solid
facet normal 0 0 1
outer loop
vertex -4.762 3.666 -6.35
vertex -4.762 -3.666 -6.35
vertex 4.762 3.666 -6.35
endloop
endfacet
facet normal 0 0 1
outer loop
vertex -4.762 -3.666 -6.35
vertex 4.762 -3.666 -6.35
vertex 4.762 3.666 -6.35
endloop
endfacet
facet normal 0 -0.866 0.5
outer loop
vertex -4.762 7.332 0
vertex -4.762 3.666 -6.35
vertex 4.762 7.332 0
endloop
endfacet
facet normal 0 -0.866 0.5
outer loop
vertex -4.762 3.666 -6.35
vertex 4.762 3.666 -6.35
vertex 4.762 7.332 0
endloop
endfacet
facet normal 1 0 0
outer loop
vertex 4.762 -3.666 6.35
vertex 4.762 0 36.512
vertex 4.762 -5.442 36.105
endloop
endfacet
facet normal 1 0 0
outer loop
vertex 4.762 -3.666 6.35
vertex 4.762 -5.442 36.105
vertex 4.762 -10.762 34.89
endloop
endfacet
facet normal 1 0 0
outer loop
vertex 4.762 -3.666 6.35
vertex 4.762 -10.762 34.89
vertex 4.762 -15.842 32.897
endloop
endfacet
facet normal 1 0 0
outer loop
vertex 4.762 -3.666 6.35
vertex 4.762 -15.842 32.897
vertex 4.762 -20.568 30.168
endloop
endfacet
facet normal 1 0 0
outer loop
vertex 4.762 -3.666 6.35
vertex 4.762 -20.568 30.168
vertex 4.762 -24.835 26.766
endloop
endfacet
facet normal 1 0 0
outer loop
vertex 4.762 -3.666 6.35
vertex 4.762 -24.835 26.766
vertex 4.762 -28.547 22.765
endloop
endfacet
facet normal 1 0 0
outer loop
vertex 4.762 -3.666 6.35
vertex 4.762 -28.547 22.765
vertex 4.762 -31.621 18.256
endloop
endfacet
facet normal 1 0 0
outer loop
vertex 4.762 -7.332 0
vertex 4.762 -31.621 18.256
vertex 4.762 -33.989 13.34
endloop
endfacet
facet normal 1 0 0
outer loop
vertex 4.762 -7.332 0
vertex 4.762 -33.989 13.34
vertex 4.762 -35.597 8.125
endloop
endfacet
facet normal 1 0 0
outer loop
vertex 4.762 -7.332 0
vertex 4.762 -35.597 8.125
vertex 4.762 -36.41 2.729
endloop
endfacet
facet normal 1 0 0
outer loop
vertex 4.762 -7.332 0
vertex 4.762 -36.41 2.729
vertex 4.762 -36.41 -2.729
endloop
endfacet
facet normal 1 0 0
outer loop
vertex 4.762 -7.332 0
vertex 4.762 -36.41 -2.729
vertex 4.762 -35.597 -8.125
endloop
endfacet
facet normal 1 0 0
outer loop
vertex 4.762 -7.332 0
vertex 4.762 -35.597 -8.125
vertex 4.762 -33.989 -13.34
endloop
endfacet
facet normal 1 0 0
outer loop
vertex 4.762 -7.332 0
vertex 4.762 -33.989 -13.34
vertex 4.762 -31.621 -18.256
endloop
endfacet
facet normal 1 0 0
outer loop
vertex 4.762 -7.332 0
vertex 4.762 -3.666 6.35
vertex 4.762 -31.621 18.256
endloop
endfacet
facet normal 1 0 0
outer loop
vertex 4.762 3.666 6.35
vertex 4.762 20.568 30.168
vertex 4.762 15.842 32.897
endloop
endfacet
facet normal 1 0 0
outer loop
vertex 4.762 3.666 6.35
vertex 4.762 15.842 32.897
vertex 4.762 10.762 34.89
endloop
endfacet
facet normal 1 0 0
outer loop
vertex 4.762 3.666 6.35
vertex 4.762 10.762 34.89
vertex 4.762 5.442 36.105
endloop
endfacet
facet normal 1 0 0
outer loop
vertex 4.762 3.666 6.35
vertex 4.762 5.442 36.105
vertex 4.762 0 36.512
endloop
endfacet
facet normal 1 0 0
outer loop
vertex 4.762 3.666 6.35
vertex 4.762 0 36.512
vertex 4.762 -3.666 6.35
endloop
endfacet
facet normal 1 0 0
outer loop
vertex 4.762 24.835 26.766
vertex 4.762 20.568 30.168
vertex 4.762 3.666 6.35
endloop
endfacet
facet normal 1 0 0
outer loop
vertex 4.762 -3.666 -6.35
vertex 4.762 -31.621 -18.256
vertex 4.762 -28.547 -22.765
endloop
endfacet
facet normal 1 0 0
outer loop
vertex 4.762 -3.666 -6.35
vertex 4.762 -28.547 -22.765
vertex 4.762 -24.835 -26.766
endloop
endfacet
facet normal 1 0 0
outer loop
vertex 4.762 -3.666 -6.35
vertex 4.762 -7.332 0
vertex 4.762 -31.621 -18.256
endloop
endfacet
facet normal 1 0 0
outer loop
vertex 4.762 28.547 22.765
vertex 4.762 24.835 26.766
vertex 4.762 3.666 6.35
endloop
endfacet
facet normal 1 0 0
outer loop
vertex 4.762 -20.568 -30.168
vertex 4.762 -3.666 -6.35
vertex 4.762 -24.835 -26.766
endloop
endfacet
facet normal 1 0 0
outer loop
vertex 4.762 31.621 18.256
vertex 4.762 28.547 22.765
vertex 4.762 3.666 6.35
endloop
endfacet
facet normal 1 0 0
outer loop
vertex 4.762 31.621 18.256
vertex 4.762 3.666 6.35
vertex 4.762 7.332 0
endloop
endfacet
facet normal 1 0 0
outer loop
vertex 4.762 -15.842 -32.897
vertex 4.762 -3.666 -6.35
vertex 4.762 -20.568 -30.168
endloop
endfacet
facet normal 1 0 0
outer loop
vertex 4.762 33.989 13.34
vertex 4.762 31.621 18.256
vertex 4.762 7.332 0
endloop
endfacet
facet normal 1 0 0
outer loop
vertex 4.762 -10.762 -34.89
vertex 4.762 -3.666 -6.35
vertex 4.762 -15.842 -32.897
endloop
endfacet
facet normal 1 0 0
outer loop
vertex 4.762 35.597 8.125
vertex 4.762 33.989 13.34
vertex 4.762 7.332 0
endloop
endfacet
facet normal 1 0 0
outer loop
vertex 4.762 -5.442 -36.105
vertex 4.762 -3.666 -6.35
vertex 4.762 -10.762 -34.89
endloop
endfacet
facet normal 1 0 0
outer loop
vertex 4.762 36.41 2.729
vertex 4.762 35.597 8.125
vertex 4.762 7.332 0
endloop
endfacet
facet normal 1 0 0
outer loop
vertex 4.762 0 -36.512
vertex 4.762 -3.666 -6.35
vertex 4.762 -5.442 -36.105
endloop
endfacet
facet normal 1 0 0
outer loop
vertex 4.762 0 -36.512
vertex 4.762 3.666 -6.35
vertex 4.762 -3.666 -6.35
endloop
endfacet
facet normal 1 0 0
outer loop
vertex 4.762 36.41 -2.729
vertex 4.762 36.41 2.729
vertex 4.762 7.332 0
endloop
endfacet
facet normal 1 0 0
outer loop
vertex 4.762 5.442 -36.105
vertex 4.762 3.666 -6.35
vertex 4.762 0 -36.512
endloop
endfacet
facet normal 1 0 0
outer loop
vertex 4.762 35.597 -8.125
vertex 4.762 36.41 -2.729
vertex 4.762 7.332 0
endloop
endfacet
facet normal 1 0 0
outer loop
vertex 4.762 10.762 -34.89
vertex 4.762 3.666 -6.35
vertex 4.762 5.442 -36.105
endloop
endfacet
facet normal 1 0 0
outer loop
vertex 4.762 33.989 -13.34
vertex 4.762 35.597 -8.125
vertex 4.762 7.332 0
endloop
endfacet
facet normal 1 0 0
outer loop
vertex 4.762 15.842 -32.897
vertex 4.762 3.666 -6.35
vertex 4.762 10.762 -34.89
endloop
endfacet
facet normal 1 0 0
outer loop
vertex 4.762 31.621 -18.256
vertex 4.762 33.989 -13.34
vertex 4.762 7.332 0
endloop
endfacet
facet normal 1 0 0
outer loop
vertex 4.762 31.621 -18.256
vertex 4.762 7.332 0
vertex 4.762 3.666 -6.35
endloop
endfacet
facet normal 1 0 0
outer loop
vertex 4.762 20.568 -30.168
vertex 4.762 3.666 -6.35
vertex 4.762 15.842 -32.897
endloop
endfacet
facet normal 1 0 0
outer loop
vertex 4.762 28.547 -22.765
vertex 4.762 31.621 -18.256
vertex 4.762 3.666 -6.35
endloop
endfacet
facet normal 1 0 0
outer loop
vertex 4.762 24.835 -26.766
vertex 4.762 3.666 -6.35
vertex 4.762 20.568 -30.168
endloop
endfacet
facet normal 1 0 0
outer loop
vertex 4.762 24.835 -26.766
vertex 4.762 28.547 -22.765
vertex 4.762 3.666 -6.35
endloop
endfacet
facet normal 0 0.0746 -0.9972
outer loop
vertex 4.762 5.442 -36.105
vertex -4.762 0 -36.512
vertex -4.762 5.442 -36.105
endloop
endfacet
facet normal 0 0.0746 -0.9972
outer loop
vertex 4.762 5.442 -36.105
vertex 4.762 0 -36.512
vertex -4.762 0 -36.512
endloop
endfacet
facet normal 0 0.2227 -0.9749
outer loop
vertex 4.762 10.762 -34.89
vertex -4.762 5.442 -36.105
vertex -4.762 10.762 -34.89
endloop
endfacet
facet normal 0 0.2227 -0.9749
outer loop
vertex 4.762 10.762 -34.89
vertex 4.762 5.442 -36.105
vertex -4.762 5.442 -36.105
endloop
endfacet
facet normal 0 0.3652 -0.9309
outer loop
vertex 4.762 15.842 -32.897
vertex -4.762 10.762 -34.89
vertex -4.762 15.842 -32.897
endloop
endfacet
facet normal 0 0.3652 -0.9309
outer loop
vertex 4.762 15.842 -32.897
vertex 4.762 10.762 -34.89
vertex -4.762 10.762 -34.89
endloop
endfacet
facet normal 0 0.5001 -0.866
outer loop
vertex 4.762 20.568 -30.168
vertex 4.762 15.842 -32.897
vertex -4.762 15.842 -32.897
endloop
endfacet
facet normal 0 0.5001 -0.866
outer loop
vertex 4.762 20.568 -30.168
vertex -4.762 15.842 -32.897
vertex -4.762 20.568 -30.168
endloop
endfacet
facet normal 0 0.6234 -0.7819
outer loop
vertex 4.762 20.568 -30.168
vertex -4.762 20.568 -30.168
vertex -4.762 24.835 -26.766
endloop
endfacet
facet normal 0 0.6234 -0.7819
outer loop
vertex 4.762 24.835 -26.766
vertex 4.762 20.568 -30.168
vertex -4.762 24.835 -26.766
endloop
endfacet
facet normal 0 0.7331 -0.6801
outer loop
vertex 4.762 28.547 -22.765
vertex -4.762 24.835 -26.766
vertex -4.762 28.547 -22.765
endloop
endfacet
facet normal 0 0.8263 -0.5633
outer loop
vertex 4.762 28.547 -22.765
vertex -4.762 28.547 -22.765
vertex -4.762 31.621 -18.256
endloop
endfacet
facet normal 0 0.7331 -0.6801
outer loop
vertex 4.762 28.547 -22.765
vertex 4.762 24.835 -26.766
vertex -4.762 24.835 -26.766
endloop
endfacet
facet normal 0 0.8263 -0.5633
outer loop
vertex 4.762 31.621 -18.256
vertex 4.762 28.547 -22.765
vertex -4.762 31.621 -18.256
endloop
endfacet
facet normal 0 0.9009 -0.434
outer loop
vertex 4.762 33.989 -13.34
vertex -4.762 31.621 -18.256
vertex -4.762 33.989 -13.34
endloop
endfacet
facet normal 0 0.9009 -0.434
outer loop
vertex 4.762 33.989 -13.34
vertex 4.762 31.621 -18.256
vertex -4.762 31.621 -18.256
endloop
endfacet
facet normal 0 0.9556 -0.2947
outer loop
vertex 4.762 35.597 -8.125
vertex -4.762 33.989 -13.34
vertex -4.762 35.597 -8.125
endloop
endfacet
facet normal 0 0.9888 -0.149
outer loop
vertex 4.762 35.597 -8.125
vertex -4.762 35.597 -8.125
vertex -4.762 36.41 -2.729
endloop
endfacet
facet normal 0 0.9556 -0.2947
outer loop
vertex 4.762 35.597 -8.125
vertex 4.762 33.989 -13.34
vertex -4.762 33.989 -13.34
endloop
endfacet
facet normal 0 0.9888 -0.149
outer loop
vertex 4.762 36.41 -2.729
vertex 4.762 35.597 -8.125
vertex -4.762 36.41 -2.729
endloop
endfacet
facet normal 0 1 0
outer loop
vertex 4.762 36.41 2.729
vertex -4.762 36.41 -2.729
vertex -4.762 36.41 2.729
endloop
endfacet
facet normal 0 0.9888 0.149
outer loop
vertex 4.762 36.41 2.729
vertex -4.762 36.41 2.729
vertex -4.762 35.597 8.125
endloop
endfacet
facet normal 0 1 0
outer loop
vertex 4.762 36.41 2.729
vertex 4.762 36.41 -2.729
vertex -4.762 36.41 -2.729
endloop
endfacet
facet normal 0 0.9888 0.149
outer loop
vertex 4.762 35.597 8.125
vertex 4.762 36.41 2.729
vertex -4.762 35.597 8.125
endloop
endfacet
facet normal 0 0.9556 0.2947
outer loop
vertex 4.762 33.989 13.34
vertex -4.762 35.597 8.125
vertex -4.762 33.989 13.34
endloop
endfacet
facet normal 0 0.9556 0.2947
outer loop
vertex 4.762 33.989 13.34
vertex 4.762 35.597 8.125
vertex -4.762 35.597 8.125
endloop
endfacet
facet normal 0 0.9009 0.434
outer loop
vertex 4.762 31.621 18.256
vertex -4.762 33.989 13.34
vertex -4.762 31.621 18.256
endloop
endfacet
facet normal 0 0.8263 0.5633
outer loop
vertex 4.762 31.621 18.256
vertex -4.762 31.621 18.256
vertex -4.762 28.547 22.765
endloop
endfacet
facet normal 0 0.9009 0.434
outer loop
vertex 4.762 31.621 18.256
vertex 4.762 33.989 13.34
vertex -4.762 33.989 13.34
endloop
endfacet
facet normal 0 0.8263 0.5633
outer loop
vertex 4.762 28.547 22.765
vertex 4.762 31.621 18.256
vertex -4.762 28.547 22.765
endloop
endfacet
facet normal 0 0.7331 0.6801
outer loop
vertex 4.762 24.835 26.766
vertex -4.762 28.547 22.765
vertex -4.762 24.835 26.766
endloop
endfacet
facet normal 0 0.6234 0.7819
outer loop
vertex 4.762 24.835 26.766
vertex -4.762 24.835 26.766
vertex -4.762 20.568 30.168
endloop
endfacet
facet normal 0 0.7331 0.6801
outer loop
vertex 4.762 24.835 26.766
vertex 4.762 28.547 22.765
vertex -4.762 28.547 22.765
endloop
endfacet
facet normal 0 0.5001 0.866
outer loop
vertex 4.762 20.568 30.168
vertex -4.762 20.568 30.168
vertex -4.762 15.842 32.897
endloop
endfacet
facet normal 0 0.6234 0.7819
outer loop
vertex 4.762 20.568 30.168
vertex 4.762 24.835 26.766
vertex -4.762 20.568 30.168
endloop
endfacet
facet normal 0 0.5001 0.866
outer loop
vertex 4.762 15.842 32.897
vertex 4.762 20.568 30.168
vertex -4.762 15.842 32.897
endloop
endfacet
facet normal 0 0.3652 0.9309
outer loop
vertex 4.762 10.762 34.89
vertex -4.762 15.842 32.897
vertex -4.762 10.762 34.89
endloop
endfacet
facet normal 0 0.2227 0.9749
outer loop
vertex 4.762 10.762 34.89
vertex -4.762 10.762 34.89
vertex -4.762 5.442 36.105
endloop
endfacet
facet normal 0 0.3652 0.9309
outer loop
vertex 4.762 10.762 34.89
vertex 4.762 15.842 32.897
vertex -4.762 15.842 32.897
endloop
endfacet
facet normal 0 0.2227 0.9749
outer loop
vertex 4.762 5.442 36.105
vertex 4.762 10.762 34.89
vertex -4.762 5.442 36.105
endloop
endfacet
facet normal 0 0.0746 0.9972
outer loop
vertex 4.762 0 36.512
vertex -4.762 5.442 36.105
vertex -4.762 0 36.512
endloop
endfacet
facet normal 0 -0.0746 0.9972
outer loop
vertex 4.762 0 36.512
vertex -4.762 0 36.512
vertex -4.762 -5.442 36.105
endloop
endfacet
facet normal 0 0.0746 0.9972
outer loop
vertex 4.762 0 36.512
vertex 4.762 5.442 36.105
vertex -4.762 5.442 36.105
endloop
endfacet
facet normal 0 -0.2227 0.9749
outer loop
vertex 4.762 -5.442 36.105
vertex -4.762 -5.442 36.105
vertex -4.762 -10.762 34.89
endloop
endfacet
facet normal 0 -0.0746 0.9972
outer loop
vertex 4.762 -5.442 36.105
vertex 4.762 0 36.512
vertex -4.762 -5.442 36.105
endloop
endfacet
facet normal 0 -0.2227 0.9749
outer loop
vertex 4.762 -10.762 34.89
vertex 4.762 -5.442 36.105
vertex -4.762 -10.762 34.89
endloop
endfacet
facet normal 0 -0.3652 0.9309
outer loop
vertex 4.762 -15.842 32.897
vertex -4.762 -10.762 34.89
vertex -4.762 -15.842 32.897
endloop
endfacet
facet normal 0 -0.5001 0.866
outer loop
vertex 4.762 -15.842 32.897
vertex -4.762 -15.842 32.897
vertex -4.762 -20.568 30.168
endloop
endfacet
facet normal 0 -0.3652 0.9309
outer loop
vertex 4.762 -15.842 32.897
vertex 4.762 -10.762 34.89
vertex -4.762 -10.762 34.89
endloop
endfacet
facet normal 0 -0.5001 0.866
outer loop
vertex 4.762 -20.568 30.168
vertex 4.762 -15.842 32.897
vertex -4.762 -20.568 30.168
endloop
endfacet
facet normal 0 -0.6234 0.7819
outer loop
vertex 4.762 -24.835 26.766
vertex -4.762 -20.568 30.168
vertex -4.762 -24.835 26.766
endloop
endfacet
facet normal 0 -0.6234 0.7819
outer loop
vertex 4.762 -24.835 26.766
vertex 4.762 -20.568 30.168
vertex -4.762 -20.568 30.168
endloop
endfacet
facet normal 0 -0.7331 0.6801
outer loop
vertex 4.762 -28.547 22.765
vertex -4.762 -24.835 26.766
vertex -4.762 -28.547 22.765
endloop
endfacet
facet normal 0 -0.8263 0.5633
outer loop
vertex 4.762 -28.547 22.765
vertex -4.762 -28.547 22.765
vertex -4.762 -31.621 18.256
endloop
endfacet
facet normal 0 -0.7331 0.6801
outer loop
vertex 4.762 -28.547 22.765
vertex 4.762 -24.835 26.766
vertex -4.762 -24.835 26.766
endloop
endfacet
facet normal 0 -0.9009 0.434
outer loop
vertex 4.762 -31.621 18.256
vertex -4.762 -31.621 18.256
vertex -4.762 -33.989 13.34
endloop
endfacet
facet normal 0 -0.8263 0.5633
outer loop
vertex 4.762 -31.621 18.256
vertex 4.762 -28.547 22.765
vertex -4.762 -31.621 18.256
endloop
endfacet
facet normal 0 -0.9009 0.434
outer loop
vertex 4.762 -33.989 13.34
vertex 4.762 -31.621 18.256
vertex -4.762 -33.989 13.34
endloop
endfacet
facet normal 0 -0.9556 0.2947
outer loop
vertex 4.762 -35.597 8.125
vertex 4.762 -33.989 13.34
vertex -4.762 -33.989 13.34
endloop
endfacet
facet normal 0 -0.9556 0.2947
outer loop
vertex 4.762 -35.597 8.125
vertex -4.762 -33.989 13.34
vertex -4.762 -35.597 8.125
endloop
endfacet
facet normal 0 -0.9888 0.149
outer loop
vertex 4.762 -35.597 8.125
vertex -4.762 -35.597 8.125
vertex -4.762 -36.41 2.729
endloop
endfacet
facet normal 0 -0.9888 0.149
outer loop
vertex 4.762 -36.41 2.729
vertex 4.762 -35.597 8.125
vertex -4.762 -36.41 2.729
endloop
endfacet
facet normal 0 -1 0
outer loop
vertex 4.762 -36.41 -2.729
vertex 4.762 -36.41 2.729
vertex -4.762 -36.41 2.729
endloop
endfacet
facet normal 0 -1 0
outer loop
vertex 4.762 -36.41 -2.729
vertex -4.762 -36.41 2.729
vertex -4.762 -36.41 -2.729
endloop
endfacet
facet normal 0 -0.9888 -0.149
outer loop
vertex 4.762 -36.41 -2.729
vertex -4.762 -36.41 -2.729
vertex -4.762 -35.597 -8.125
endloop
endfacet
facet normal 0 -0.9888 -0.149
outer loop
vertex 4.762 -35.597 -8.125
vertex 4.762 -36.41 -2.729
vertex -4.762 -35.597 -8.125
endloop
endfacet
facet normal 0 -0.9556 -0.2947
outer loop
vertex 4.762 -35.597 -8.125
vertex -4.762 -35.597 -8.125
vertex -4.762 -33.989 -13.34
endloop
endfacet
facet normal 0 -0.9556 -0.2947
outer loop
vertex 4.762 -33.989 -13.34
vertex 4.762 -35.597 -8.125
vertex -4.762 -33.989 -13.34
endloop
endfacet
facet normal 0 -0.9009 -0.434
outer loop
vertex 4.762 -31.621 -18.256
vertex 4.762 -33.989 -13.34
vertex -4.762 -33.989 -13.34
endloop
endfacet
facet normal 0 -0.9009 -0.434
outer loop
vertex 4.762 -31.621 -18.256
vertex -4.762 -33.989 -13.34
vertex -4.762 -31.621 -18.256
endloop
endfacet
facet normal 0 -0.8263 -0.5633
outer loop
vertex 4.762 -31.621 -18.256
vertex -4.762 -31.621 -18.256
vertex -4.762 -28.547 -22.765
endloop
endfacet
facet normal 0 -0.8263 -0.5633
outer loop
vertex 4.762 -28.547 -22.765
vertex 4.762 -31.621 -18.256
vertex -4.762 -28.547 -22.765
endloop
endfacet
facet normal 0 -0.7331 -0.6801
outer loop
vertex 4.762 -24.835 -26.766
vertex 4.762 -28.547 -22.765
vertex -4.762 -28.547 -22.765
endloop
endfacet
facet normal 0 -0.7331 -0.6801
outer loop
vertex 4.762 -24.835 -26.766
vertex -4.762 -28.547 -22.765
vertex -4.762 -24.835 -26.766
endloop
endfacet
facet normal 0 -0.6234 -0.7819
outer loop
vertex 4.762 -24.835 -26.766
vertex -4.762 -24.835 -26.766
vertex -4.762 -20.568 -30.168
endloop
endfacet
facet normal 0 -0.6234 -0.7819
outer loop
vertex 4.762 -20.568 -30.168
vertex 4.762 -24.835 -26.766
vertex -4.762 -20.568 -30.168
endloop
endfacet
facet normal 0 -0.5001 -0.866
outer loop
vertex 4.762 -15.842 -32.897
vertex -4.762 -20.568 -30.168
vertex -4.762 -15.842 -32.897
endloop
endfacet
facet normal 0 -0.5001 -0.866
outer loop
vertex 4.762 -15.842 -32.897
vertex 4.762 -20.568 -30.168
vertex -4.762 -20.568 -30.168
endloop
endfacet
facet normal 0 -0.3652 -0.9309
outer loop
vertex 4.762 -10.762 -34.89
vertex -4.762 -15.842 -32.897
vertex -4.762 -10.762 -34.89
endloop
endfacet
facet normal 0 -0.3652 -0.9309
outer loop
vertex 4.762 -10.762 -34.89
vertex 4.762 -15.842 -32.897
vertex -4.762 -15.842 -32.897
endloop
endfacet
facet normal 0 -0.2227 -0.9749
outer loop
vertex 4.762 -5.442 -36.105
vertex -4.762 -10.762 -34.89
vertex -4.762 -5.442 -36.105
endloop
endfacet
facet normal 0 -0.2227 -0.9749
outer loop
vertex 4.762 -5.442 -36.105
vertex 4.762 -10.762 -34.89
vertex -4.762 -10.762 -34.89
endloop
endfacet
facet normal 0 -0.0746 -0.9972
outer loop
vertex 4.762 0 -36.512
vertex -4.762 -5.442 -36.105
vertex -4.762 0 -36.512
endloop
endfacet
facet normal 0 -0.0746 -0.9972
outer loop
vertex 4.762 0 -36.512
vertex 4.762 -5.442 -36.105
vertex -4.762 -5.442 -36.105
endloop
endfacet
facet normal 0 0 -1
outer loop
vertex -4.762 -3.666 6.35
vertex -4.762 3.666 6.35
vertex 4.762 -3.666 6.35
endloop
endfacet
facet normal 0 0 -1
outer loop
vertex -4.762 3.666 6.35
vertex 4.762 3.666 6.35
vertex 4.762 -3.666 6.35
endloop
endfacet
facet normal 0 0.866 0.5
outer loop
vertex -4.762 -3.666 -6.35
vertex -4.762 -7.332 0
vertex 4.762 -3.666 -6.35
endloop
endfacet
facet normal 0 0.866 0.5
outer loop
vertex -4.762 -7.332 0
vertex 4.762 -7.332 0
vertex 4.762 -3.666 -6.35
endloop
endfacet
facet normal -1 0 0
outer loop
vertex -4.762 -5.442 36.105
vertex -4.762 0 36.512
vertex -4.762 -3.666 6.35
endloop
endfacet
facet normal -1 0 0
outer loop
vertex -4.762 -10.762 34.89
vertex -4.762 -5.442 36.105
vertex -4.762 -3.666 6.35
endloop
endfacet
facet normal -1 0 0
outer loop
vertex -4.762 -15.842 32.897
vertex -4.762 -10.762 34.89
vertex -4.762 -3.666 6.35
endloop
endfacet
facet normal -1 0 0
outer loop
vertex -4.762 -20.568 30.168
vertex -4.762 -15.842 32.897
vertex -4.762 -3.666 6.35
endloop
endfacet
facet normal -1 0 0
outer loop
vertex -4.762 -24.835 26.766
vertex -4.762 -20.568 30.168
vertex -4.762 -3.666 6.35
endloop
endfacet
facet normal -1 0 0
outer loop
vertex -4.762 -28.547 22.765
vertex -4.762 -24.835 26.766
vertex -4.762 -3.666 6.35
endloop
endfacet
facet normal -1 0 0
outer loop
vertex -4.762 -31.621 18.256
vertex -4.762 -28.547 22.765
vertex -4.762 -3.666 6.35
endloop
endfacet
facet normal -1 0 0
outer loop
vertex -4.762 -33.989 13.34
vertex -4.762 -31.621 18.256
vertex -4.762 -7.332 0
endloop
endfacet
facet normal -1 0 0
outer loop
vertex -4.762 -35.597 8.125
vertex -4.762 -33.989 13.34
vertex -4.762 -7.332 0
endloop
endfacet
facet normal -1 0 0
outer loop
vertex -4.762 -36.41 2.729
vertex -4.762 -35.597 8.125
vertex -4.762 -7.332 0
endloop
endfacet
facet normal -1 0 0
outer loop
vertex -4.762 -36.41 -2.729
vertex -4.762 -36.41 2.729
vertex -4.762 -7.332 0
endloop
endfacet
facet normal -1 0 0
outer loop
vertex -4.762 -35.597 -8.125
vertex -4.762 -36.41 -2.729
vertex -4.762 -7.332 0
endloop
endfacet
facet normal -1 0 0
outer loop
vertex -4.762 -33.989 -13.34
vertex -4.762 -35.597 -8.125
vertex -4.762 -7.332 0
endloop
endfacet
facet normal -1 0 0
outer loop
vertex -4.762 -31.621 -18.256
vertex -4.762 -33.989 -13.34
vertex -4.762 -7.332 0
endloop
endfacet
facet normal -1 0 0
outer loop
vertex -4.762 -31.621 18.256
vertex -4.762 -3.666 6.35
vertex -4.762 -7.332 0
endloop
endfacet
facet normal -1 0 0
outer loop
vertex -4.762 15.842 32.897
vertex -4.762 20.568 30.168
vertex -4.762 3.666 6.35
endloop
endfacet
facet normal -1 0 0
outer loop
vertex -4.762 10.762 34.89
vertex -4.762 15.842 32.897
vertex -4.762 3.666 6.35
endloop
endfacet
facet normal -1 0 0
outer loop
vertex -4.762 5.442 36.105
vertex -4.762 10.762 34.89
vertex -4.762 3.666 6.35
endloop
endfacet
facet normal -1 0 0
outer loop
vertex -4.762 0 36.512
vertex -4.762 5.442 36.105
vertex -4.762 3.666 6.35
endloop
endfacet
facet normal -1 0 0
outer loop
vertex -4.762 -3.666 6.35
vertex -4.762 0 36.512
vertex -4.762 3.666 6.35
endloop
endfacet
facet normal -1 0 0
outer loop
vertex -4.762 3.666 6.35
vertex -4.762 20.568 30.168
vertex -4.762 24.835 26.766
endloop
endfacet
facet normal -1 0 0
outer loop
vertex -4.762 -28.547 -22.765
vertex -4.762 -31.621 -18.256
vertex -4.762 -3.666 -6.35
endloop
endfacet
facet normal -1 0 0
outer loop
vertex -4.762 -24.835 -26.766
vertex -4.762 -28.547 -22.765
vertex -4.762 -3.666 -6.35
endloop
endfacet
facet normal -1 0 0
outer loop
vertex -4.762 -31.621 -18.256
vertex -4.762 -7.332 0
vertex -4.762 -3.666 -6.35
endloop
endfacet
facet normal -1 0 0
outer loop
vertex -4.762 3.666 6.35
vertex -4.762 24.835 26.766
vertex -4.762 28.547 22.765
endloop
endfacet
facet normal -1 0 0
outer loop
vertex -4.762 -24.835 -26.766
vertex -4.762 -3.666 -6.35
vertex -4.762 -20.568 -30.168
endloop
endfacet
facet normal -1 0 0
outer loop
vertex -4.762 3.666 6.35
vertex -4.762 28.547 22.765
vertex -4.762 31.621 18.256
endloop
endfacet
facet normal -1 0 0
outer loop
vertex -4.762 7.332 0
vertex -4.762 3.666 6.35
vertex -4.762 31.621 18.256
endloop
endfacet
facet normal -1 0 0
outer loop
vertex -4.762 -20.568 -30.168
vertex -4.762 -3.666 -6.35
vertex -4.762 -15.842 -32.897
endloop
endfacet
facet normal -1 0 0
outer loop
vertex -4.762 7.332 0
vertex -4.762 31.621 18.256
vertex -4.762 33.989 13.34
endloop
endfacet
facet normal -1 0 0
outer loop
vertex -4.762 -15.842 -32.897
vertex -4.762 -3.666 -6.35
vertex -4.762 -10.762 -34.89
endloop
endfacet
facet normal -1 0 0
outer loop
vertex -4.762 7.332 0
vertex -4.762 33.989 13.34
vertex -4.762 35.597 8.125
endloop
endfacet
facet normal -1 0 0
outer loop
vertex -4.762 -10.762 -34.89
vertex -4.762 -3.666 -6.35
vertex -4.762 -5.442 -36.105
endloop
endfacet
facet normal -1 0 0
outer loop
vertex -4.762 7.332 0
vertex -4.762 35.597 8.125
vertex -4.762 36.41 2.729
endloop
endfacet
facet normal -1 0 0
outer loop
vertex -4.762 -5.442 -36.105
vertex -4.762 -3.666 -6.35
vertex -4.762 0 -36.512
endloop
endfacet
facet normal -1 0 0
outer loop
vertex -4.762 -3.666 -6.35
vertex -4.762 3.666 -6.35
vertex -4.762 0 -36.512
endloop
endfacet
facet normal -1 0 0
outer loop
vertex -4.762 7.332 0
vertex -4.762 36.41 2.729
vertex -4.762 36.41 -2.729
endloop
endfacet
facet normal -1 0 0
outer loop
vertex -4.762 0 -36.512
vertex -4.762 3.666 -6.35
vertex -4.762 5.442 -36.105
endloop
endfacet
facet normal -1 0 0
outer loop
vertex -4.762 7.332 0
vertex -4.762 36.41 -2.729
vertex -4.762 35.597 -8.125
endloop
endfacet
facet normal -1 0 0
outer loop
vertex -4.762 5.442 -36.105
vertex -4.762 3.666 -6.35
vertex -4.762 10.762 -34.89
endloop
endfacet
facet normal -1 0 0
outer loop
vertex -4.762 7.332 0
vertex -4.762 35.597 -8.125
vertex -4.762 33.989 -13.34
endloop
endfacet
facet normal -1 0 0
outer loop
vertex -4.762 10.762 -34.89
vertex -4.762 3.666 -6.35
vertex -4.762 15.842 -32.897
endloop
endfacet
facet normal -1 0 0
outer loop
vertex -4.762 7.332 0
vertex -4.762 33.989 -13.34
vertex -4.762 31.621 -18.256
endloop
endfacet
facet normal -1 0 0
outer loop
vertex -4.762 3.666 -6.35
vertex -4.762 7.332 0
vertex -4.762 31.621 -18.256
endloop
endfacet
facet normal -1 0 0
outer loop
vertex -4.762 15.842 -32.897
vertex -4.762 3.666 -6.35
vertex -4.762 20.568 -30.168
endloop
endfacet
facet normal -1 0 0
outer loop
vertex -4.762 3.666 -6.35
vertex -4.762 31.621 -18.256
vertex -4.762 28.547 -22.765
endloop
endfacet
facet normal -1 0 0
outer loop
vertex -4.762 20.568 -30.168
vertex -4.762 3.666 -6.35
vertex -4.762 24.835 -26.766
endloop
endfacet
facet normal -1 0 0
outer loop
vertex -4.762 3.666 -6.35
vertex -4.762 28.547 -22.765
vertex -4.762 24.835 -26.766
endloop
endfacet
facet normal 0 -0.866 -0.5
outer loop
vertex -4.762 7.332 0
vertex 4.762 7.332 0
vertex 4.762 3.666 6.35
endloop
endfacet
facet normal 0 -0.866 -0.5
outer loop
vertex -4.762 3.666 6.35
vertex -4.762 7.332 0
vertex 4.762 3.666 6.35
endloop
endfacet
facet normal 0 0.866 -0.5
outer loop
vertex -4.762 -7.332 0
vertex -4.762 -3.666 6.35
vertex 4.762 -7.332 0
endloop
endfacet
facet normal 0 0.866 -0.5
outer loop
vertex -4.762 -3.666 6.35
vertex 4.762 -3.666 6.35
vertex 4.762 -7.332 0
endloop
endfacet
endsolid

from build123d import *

# Parameters (mm, degrees)
SKETCH2_R           = 36.5125
BOSS_EXTRUDE1_DEPTH = 4.7625


with BuildPart() as part:
    # Sketch2 → Boss-Extrude1 (new body, symmetric)
    with BuildSketch(Plane(origin=(0, 0, 0), x_dir=(0, 0, -1), z_dir=(1, 0, 0))):
        Circle(SKETCH2_R)
        Polygon((0, 7.332348419), (-6.35, 3.666174209), (-6.35, -3.666174209), (0, -7.332348419), (6.35, -3.666174209), (6.35, 3.666174209), align=None, mode=Mode.SUBTRACT)
    extrude(amount=BOSS_EXTRUDE1_DEPTH, both=True)


solid = part.part
